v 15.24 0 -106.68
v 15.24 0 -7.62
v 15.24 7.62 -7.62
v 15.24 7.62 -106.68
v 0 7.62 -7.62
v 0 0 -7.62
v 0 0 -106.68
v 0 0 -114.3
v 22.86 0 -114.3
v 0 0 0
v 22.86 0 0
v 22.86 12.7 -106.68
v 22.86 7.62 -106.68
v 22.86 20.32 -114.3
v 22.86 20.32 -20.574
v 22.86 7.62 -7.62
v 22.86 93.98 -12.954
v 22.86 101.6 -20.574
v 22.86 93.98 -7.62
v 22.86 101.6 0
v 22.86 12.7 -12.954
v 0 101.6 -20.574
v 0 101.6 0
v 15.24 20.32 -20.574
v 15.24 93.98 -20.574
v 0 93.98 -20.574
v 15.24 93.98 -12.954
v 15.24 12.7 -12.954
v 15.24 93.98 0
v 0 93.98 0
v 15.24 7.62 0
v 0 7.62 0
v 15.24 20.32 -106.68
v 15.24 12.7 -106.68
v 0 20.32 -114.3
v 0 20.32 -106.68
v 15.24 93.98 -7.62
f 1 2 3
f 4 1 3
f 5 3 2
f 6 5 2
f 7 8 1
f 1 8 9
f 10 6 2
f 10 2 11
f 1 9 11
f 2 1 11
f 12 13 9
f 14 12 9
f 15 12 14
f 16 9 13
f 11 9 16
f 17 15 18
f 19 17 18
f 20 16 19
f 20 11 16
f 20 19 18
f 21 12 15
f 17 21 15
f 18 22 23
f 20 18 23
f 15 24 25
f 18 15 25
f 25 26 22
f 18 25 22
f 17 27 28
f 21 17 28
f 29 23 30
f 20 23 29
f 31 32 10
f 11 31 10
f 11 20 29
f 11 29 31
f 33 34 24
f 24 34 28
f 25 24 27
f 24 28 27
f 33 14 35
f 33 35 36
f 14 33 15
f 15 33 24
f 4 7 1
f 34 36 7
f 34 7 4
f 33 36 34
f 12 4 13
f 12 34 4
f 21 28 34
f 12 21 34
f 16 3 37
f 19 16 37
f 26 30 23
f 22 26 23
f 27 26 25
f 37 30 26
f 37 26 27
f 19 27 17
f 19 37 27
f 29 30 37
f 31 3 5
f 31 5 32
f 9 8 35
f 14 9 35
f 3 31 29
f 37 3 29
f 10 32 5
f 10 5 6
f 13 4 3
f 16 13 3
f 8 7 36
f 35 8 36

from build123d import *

# Parameters (mm, degrees)
F1_DEPTH = 22.86
F2_W     = 15.24
F2_H     = 119.38
F3_DEPTH = 106.68
F4_W     = 7.62
F4_H     = 7.62
F5_DEPTH = 15.24


with BuildPart() as f1:
    # F0 (on Right) → F1 (new body)
    with BuildSketch(Plane.YZ):
        Polygon((0, 0), (0, -114.3), (20.32, -114.3), (20.32, -20.574), (101.6, -20.574), (101.6, 0), (20.32, 0), align=None)
        Polygon((12.7, -106.68), (7.62, -106.68), (7.62, -7.62), (93.98, -7.62), (93.98, -12.954), (12.7, -12.954), align=None, mode=Mode.SUBTRACT)
    extrude(amount=F1_DEPTH)

    # F2 (on face) → F3 (cut)
    with BuildSketch(Plane.XY):
        with Locations((7.62, 34.29)):
            Rectangle(F2_W, F2_H)
    extrude(amount=-F3_DEPTH, mode=Mode.SUBTRACT)

    # F4 (on face) → F5 (join, through all)
    with BuildSketch(Plane(origin=(15.24, 0, 0), x_dir=(0, -1, 0), z_dir=(-1, 0, 0))):
        with Locations((-3.81, -3.81)):
            Rectangle(F4_W, F4_H)
    extrude(amount=F5_DEPTH)


solid = f1.part
